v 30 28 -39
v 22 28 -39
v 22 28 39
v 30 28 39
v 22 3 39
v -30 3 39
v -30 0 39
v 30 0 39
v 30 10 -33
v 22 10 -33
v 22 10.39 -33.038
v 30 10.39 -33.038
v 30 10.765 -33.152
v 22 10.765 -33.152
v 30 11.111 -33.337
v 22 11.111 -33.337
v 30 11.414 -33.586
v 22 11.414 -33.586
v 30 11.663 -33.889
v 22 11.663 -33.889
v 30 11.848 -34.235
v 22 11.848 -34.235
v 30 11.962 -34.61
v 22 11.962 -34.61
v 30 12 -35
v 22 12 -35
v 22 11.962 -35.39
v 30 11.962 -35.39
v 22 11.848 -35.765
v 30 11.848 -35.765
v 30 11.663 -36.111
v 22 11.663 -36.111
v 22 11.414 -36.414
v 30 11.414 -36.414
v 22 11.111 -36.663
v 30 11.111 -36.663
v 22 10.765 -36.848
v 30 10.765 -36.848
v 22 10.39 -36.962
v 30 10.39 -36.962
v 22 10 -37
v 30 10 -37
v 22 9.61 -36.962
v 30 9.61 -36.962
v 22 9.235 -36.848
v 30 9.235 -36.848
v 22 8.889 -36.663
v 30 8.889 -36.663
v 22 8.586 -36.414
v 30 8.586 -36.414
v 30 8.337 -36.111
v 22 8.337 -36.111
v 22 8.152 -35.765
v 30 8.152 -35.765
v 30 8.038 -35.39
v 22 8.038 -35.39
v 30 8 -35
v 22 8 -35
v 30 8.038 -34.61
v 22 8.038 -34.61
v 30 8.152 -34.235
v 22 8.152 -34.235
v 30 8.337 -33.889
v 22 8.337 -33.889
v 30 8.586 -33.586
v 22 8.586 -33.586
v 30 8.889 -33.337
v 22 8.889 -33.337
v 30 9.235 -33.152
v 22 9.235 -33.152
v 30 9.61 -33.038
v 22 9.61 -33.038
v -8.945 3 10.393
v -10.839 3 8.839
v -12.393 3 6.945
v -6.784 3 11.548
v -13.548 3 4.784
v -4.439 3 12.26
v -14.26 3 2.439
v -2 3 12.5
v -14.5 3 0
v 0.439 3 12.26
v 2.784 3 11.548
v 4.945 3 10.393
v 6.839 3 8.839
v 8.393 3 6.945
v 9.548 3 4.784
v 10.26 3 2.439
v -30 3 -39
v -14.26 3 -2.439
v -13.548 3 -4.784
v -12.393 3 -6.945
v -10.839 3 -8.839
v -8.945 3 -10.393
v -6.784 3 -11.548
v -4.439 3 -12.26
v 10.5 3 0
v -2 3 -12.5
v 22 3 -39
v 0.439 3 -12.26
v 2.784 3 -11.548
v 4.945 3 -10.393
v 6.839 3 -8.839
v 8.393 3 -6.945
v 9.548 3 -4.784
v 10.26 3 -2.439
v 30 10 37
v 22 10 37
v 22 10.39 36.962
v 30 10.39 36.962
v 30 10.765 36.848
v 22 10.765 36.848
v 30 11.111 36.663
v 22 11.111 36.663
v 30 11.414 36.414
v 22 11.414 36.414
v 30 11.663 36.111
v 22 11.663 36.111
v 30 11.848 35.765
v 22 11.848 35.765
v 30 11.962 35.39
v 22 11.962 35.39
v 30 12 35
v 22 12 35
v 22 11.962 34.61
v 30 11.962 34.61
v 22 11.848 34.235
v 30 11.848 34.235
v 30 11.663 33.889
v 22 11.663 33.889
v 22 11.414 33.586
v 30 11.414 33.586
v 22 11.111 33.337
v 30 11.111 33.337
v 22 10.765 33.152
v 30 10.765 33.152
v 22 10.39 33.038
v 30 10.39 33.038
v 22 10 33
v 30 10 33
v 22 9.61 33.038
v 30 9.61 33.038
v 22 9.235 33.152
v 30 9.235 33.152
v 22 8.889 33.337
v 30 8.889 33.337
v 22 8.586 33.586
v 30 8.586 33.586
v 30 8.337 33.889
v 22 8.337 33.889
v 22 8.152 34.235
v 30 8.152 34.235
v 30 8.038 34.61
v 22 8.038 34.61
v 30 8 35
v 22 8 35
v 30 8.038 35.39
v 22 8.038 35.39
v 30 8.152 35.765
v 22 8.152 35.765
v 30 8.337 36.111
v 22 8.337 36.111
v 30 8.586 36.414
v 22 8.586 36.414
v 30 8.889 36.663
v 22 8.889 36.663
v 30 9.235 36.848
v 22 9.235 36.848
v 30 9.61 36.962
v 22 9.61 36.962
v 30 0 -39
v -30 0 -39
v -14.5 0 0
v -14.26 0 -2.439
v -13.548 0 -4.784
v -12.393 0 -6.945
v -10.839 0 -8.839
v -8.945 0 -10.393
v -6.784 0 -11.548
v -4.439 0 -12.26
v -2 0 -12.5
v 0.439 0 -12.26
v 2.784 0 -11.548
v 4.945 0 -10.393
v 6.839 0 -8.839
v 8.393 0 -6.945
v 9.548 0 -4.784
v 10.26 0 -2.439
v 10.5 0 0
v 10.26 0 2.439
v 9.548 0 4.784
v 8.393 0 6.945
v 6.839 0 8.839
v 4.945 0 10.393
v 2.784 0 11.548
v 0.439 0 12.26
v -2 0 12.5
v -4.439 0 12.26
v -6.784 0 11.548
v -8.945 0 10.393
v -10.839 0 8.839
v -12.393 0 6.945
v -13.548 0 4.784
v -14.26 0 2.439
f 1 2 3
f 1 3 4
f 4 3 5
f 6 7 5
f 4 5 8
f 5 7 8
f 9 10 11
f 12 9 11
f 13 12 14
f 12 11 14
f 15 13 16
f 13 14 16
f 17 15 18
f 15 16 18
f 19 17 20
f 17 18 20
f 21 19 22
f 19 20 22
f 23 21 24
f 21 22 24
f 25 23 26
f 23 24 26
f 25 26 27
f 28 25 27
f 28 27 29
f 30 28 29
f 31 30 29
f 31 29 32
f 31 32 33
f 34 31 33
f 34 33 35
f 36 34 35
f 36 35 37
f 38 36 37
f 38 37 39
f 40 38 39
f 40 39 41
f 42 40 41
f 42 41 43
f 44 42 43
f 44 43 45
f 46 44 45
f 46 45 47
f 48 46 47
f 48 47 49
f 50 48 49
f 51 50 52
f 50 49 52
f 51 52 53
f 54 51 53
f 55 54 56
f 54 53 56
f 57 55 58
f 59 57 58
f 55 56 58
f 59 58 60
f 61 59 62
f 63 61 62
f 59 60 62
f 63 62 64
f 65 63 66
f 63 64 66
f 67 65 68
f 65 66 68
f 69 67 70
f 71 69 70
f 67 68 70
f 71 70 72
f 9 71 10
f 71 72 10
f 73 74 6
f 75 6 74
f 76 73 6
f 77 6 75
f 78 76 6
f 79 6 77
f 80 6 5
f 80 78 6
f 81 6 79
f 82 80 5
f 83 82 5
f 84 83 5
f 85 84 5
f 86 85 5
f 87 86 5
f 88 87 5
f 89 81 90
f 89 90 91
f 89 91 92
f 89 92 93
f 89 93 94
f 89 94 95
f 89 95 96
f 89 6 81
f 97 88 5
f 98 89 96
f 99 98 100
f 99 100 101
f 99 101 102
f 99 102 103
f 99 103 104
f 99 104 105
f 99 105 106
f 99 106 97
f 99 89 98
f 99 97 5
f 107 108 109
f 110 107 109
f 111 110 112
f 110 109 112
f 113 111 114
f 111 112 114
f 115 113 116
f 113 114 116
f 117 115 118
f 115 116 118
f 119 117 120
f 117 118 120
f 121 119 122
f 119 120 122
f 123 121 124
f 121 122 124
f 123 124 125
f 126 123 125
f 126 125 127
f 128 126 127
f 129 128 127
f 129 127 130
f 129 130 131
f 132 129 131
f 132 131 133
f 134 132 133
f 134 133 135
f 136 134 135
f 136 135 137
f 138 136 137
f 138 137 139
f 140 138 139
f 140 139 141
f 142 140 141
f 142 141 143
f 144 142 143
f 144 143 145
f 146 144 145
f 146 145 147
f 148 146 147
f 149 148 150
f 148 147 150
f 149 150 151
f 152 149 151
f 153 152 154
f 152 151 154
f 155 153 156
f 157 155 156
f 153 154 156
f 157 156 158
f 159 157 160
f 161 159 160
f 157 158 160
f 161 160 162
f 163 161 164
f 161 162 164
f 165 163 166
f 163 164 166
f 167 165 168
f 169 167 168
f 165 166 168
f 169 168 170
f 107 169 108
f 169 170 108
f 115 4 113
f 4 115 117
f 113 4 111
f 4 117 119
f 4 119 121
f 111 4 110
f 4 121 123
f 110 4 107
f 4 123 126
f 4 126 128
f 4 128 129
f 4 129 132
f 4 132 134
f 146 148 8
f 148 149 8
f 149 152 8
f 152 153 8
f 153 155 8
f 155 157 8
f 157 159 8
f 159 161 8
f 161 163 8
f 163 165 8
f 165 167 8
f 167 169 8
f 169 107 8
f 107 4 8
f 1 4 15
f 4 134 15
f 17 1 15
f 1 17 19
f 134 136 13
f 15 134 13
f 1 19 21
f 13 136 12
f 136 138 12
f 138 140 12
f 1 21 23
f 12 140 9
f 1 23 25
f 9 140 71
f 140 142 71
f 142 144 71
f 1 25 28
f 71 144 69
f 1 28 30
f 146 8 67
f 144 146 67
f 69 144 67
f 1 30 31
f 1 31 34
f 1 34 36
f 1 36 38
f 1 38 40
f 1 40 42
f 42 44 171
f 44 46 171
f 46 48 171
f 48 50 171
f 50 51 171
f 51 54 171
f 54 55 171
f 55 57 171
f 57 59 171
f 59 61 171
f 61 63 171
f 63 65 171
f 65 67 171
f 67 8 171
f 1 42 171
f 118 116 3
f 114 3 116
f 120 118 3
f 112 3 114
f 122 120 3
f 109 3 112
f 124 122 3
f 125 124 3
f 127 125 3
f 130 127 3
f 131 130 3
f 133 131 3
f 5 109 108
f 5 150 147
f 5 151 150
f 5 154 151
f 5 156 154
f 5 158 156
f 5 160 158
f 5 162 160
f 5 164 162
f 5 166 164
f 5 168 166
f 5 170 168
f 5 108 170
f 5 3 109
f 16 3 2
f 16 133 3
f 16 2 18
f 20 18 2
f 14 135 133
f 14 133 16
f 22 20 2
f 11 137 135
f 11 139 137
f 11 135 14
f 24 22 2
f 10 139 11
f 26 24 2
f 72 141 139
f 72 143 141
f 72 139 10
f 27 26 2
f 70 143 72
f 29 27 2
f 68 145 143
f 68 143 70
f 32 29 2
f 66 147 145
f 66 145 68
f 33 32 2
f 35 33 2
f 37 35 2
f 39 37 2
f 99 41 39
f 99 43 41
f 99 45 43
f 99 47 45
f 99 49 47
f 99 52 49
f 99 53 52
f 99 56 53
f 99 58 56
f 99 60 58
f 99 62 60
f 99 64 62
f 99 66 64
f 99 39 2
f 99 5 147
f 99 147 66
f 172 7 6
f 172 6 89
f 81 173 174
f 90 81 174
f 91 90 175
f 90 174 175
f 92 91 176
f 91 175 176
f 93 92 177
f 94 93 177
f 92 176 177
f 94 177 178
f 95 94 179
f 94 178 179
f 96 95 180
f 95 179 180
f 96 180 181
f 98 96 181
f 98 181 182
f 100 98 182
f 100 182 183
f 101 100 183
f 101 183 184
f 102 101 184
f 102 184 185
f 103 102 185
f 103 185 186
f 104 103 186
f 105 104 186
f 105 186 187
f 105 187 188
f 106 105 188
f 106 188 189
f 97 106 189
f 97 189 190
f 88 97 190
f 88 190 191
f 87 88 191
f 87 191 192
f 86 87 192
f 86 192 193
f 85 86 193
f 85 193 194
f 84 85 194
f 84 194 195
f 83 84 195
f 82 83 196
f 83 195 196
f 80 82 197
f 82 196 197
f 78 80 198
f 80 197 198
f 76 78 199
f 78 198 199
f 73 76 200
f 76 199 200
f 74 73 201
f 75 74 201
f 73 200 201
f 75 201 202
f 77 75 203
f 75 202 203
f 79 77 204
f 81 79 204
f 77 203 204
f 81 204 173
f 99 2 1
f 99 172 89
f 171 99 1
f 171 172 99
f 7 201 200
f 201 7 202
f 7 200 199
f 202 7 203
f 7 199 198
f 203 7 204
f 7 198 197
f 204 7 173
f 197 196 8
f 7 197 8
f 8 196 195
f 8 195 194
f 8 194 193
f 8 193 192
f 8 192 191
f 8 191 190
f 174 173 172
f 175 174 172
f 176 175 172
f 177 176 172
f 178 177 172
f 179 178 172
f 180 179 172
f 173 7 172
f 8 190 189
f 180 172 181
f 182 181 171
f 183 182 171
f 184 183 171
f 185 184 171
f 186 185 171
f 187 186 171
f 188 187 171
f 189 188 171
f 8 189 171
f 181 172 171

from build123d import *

# Parameters (mm, degrees)
SKETCH1_W           = 60
SKETCH1_H           = 78
BOSS_EXTRUDE1_DEPTH = 3
SKETCH2_W           = 8
SKETCH2_H           = 78
BOSS_EXTRUDE2_DEPTH = 25
SKETCH5_R           = 2
CUT_EXTRUDE2_DEPTH  = 30
SKETCH6_R           = 12.5
CUT_EXTRUDE3_DEPTH  = 29


with BuildPart() as part:
    # Sketch1 → Boss-Extrude1 (new body)
    with BuildSketch(Plane(origin=(0, 0, 0), x_dir=(1, 0, 0), z_dir=(0, 1, 0))):
        Rectangle(SKETCH1_W, SKETCH1_H)
    extrude(amount=BOSS_EXTRUDE1_DEPTH)

    # Sketch2 → Boss-Extrude2 (add)
    with BuildSketch(Plane(origin=(0, 3, 0), x_dir=(1, 0, 0), z_dir=(0, 1, 0))):
        with Locations((26, 0)):
            Rectangle(SKETCH2_W, SKETCH2_H)
    extrude(amount=BOSS_EXTRUDE2_DEPTH)

    # Sketch5 → Cut-Extrude2 (cut)
    with BuildSketch(Plane.ZY.offset(-22)):
        with Locations((35, 10)):
            Circle(SKETCH5_R)
        with Locations((-35, 10)):
            Circle(SKETCH5_R)
    extrude(amount=-CUT_EXTRUDE2_DEPTH, mode=Mode.SUBTRACT)

    # Sketch6 → Cut-Extrude3 (cut, through all)
    with BuildSketch(Plane(origin=(0, 0, 0), x_dir=(-1, 0, 0), z_dir=(0, -1, 0))):
        with Locations((2, 0)):
            Circle(SKETCH6_R)
    extrude(amount=-CUT_EXTRUDE3_DEPTH, mode=Mode.SUBTRACT)


solid = part.part
